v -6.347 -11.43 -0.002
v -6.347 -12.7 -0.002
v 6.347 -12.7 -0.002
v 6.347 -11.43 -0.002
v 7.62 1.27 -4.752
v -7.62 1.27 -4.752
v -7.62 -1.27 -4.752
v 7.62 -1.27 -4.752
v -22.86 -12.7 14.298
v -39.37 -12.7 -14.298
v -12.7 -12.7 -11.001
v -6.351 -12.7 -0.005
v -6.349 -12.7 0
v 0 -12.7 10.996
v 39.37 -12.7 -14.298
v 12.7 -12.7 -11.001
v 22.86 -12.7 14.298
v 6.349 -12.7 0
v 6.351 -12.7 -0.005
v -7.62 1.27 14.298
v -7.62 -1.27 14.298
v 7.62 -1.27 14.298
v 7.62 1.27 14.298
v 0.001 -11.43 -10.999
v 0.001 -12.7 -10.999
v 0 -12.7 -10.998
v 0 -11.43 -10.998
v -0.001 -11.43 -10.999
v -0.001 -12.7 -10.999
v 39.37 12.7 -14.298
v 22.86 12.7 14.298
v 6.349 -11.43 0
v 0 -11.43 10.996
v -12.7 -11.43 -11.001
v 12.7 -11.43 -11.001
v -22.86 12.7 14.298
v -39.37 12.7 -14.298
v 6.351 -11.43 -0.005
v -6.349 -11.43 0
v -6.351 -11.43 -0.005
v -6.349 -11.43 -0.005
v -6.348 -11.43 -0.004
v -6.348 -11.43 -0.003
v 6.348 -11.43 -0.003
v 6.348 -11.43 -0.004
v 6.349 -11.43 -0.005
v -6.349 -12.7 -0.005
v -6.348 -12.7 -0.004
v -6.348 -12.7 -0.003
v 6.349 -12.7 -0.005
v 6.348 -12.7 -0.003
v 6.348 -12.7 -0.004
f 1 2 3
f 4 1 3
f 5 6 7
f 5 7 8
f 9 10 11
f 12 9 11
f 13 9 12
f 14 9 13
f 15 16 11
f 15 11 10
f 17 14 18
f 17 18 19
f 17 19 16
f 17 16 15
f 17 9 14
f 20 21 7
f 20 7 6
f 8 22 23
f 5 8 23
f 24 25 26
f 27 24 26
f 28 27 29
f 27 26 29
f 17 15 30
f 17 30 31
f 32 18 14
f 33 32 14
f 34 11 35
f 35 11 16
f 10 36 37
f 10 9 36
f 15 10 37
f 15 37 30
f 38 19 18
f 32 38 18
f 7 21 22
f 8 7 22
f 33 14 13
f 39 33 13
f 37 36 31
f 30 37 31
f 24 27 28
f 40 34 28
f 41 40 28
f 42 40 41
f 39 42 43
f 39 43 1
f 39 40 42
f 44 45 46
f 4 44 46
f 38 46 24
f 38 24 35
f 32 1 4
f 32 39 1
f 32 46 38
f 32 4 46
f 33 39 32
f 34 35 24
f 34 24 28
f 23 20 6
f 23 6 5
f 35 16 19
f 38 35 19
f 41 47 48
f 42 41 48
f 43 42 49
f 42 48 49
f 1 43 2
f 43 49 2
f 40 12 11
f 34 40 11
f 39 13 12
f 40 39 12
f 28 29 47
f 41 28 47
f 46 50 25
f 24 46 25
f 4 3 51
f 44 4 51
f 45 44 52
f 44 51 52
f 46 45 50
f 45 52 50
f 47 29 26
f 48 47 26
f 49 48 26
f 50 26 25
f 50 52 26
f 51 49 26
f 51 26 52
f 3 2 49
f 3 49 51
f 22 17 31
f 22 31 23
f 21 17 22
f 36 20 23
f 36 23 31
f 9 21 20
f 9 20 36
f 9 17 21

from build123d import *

# Parameters (mm, degrees)
F1_DEPTH = 12.7
F3_DEPTH = 1.27
F4_DEPTH = 1.27
F5_W     = 15.24
F5_H     = 2.54
F6_DEPTH = 19.05


with BuildPart() as f1:
    # F0 (on Front) → F1 (new body, symmetric)
    with BuildSketch(Plane.XZ):
        Polygon((-22.86, 14.2980794165), (-31.115, 0), (0, 0), (0, 14.2980794165), align=None)
        Polygon((0, 14.2980794165), (0, 0), (31.115, 0), (22.86, 14.2980794165), align=None)
        Polygon((0, 0), (0, -14.2980794165), (39.37, -14.2980794165), (31.115, 0), align=None)
        Polygon((-31.115, 0), (-39.37, -14.2980794165), (0, -14.2980794165), (0, 0), align=None)
    extrude(amount=F1_DEPTH, both=True)

    # F2 (on face) → F3 (cut)
    with BuildSketch(Plane.XZ.offset(12.7)):
        with BuildLine():
            Line((0, -11.0009658396), (-0.00127, -10.9987661351))
            ThreePointArc((-0.00127, -10.9987661351), (-0.0021997045, -10.9996958396), (-0.00254, -11.0009658396))
            Line((-0.00254, -11.0009658396), (0, -11.0009658396))
        make_face()
        with BuildLine():
            ThreePointArc((-6.34873, -0.0046429161), (-6.35, -0.0049832116), (-6.35127, -0.0046429161))
            Line((-6.35127, -0.0046429161), (-12.7, -11.0009658396))
            Line((-12.7, -11.0009658396), (-0.00254, -11.0009658396))
            ThreePointArc((-0.00254, -11.0009658396), (-0.0021997045, -10.9996958396), (-0.00127, -10.9987661351))
            Line((-0.00127, -10.9987661351), (-6.34873, -0.0046429161))
        make_face()
        with BuildLine():
            Line((-6.34873, -0.0046429161), (-6.35, -0.0024432116))
            Line((-6.35, -0.0024432116), (-6.35127, -0.0046429161))
            ThreePointArc((-6.35127, -0.0046429161), (-6.35, -0.0049832116), (-6.34873, -0.0046429161))
        make_face()
    extrude(amount=-F3_DEPTH, mode=Mode.SUBTRACT)

    # F2 (on face) → F4 (cut)
    with BuildSketch(Plane.XZ.offset(12.7)):
        with BuildLine():
            Line((6.34873, -0.0002435071), (0, 10.9960794165))
            Line((0, 10.9960794165), (-6.34873, -0.0002435071))
            ThreePointArc((-6.34873, -0.0002435071), (-6.3478002955, -0.0011732116), (-6.34746, -0.0024432116))
            Line((-6.34746, -0.0024432116), (6.34746, -0.0024432116))
            ThreePointArc((6.34746, -0.0024432116), (6.3478002955, -0.0011732116), (6.34873, -0.0002435071))
        make_face()
        with BuildLine():
            ThreePointArc((-6.34873, -0.0046429161), (-6.35, -0.0049832116), (-6.35127, -0.0046429161))
            Line((-6.35127, -0.0046429161), (-12.7, -11.0009658396))
            Line((-12.7, -11.0009658396), (-0.00254, -11.0009658396))
            ThreePointArc((-0.00254, -11.0009658396), (-0.0021997045, -10.9996958396), (-0.00127, -10.9987661351))
            Line((-0.00127, -10.9987661351), (-6.34873, -0.0046429161))
        make_face()
        with BuildLine():
            Line((12.7, -11.0009658396), (6.35127, -0.0046429161))
            ThreePointArc((6.35127, -0.0046429161), (6.35, -0.0049832116), (6.34873, -0.0046429161))
            Line((6.34873, -0.0046429161), (0.00127, -10.9987661351))
            ThreePointArc((0.00127, -10.9987661351), (0.0021997045, -10.9996958396), (0.00254, -11.0009658396))
            Line((0.00254, -11.0009658396), (12.7, -11.0009658396))
        make_face()
        with BuildLine():
            Line((-6.34873, -0.0046429161), (-6.35, -0.0024432116))
            Line((-6.35, -0.0024432116), (-6.35127, -0.0046429161))
            ThreePointArc((-6.35127, -0.0046429161), (-6.35, -0.0049832116), (-6.34873, -0.0046429161))
        make_face()
        with BuildLine():
            Line((-6.34746, -0.0024432116), (-6.35, -0.0024432116))
            Line((-6.35, -0.0024432116), (-6.34873, -0.0046429161))
            ThreePointArc((-6.34873, -0.0046429161), (-6.3478002955, -0.0037132116), (-6.34746, -0.0024432116))
        make_face()
        with BuildLine():
            ThreePointArc((-6.34746, -0.0024432116), (-6.3478002955, -0.0011732116), (-6.34873, -0.0002435071))
            Line((-6.34873, -0.0002435071), (-6.35, -0.0024432116))
            Line((-6.35, -0.0024432116), (-6.34746, -0.0024432116))
        make_face()
        with BuildLine():
            Line((6.35, -0.0024432116), (6.34873, -0.0002435071))
            ThreePointArc((6.34873, -0.0002435071), (6.3478002955, -0.0011732116), (6.34746, -0.0024432116))
            Line((6.34746, -0.0024432116), (6.35, -0.0024432116))
        make_face()
        with BuildLine():
            Line((6.34873, -0.0046429161), (6.35, -0.0024432116))
            Line((6.35, -0.0024432116), (6.34746, -0.0024432116))
            ThreePointArc((6.34746, -0.0024432116), (6.3478002955, -0.0037132116), (6.34873, -0.0046429161))
        make_face()
        with BuildLine():
            Line((6.35127, -0.0046429161), (6.35, -0.0024432116))
            Line((6.35, -0.0024432116), (6.34873, -0.0046429161))
            ThreePointArc((6.34873, -0.0046429161), (6.35, -0.0049832116), (6.35127, -0.0046429161))
        make_face()
        with BuildLine():
            Line((0, -11.0009658396), (-0.00127, -10.9987661351))
            ThreePointArc((-0.00127, -10.9987661351), (-0.0021997045, -10.9996958396), (-0.00254, -11.0009658396))
            Line((-0.00254, -11.0009658396), (0, -11.0009658396))
        make_face()
        with BuildLine():
            ThreePointArc((0.00127, -10.9987661351), (0, -10.9984258396), (-0.00127, -10.9987661351))
            Line((-0.00127, -10.9987661351), (0, -11.0009658396))
            Line((0, -11.0009658396), (0.00127, -10.9987661351))
        make_face()
        with BuildLine():
            ThreePointArc((0.00254, -11.0009658396), (0.0021997045, -10.9996958396), (0.00127, -10.9987661351))
            Line((0.00127, -10.9987661351), (0, -11.0009658396))
            Line((0, -11.0009658396), (0.00254, -11.0009658396))
        make_face()
    extrude(amount=-F4_DEPTH, mode=Mode.SUBTRACT)

    # F5 (on face) → F6 (cut)
    with BuildSketch(Plane.XY.offset(14.2980794165)):
        Rectangle(F5_W, F5_H)
    extrude(amount=-F6_DEPTH, mode=Mode.SUBTRACT)


solid = f1.part
